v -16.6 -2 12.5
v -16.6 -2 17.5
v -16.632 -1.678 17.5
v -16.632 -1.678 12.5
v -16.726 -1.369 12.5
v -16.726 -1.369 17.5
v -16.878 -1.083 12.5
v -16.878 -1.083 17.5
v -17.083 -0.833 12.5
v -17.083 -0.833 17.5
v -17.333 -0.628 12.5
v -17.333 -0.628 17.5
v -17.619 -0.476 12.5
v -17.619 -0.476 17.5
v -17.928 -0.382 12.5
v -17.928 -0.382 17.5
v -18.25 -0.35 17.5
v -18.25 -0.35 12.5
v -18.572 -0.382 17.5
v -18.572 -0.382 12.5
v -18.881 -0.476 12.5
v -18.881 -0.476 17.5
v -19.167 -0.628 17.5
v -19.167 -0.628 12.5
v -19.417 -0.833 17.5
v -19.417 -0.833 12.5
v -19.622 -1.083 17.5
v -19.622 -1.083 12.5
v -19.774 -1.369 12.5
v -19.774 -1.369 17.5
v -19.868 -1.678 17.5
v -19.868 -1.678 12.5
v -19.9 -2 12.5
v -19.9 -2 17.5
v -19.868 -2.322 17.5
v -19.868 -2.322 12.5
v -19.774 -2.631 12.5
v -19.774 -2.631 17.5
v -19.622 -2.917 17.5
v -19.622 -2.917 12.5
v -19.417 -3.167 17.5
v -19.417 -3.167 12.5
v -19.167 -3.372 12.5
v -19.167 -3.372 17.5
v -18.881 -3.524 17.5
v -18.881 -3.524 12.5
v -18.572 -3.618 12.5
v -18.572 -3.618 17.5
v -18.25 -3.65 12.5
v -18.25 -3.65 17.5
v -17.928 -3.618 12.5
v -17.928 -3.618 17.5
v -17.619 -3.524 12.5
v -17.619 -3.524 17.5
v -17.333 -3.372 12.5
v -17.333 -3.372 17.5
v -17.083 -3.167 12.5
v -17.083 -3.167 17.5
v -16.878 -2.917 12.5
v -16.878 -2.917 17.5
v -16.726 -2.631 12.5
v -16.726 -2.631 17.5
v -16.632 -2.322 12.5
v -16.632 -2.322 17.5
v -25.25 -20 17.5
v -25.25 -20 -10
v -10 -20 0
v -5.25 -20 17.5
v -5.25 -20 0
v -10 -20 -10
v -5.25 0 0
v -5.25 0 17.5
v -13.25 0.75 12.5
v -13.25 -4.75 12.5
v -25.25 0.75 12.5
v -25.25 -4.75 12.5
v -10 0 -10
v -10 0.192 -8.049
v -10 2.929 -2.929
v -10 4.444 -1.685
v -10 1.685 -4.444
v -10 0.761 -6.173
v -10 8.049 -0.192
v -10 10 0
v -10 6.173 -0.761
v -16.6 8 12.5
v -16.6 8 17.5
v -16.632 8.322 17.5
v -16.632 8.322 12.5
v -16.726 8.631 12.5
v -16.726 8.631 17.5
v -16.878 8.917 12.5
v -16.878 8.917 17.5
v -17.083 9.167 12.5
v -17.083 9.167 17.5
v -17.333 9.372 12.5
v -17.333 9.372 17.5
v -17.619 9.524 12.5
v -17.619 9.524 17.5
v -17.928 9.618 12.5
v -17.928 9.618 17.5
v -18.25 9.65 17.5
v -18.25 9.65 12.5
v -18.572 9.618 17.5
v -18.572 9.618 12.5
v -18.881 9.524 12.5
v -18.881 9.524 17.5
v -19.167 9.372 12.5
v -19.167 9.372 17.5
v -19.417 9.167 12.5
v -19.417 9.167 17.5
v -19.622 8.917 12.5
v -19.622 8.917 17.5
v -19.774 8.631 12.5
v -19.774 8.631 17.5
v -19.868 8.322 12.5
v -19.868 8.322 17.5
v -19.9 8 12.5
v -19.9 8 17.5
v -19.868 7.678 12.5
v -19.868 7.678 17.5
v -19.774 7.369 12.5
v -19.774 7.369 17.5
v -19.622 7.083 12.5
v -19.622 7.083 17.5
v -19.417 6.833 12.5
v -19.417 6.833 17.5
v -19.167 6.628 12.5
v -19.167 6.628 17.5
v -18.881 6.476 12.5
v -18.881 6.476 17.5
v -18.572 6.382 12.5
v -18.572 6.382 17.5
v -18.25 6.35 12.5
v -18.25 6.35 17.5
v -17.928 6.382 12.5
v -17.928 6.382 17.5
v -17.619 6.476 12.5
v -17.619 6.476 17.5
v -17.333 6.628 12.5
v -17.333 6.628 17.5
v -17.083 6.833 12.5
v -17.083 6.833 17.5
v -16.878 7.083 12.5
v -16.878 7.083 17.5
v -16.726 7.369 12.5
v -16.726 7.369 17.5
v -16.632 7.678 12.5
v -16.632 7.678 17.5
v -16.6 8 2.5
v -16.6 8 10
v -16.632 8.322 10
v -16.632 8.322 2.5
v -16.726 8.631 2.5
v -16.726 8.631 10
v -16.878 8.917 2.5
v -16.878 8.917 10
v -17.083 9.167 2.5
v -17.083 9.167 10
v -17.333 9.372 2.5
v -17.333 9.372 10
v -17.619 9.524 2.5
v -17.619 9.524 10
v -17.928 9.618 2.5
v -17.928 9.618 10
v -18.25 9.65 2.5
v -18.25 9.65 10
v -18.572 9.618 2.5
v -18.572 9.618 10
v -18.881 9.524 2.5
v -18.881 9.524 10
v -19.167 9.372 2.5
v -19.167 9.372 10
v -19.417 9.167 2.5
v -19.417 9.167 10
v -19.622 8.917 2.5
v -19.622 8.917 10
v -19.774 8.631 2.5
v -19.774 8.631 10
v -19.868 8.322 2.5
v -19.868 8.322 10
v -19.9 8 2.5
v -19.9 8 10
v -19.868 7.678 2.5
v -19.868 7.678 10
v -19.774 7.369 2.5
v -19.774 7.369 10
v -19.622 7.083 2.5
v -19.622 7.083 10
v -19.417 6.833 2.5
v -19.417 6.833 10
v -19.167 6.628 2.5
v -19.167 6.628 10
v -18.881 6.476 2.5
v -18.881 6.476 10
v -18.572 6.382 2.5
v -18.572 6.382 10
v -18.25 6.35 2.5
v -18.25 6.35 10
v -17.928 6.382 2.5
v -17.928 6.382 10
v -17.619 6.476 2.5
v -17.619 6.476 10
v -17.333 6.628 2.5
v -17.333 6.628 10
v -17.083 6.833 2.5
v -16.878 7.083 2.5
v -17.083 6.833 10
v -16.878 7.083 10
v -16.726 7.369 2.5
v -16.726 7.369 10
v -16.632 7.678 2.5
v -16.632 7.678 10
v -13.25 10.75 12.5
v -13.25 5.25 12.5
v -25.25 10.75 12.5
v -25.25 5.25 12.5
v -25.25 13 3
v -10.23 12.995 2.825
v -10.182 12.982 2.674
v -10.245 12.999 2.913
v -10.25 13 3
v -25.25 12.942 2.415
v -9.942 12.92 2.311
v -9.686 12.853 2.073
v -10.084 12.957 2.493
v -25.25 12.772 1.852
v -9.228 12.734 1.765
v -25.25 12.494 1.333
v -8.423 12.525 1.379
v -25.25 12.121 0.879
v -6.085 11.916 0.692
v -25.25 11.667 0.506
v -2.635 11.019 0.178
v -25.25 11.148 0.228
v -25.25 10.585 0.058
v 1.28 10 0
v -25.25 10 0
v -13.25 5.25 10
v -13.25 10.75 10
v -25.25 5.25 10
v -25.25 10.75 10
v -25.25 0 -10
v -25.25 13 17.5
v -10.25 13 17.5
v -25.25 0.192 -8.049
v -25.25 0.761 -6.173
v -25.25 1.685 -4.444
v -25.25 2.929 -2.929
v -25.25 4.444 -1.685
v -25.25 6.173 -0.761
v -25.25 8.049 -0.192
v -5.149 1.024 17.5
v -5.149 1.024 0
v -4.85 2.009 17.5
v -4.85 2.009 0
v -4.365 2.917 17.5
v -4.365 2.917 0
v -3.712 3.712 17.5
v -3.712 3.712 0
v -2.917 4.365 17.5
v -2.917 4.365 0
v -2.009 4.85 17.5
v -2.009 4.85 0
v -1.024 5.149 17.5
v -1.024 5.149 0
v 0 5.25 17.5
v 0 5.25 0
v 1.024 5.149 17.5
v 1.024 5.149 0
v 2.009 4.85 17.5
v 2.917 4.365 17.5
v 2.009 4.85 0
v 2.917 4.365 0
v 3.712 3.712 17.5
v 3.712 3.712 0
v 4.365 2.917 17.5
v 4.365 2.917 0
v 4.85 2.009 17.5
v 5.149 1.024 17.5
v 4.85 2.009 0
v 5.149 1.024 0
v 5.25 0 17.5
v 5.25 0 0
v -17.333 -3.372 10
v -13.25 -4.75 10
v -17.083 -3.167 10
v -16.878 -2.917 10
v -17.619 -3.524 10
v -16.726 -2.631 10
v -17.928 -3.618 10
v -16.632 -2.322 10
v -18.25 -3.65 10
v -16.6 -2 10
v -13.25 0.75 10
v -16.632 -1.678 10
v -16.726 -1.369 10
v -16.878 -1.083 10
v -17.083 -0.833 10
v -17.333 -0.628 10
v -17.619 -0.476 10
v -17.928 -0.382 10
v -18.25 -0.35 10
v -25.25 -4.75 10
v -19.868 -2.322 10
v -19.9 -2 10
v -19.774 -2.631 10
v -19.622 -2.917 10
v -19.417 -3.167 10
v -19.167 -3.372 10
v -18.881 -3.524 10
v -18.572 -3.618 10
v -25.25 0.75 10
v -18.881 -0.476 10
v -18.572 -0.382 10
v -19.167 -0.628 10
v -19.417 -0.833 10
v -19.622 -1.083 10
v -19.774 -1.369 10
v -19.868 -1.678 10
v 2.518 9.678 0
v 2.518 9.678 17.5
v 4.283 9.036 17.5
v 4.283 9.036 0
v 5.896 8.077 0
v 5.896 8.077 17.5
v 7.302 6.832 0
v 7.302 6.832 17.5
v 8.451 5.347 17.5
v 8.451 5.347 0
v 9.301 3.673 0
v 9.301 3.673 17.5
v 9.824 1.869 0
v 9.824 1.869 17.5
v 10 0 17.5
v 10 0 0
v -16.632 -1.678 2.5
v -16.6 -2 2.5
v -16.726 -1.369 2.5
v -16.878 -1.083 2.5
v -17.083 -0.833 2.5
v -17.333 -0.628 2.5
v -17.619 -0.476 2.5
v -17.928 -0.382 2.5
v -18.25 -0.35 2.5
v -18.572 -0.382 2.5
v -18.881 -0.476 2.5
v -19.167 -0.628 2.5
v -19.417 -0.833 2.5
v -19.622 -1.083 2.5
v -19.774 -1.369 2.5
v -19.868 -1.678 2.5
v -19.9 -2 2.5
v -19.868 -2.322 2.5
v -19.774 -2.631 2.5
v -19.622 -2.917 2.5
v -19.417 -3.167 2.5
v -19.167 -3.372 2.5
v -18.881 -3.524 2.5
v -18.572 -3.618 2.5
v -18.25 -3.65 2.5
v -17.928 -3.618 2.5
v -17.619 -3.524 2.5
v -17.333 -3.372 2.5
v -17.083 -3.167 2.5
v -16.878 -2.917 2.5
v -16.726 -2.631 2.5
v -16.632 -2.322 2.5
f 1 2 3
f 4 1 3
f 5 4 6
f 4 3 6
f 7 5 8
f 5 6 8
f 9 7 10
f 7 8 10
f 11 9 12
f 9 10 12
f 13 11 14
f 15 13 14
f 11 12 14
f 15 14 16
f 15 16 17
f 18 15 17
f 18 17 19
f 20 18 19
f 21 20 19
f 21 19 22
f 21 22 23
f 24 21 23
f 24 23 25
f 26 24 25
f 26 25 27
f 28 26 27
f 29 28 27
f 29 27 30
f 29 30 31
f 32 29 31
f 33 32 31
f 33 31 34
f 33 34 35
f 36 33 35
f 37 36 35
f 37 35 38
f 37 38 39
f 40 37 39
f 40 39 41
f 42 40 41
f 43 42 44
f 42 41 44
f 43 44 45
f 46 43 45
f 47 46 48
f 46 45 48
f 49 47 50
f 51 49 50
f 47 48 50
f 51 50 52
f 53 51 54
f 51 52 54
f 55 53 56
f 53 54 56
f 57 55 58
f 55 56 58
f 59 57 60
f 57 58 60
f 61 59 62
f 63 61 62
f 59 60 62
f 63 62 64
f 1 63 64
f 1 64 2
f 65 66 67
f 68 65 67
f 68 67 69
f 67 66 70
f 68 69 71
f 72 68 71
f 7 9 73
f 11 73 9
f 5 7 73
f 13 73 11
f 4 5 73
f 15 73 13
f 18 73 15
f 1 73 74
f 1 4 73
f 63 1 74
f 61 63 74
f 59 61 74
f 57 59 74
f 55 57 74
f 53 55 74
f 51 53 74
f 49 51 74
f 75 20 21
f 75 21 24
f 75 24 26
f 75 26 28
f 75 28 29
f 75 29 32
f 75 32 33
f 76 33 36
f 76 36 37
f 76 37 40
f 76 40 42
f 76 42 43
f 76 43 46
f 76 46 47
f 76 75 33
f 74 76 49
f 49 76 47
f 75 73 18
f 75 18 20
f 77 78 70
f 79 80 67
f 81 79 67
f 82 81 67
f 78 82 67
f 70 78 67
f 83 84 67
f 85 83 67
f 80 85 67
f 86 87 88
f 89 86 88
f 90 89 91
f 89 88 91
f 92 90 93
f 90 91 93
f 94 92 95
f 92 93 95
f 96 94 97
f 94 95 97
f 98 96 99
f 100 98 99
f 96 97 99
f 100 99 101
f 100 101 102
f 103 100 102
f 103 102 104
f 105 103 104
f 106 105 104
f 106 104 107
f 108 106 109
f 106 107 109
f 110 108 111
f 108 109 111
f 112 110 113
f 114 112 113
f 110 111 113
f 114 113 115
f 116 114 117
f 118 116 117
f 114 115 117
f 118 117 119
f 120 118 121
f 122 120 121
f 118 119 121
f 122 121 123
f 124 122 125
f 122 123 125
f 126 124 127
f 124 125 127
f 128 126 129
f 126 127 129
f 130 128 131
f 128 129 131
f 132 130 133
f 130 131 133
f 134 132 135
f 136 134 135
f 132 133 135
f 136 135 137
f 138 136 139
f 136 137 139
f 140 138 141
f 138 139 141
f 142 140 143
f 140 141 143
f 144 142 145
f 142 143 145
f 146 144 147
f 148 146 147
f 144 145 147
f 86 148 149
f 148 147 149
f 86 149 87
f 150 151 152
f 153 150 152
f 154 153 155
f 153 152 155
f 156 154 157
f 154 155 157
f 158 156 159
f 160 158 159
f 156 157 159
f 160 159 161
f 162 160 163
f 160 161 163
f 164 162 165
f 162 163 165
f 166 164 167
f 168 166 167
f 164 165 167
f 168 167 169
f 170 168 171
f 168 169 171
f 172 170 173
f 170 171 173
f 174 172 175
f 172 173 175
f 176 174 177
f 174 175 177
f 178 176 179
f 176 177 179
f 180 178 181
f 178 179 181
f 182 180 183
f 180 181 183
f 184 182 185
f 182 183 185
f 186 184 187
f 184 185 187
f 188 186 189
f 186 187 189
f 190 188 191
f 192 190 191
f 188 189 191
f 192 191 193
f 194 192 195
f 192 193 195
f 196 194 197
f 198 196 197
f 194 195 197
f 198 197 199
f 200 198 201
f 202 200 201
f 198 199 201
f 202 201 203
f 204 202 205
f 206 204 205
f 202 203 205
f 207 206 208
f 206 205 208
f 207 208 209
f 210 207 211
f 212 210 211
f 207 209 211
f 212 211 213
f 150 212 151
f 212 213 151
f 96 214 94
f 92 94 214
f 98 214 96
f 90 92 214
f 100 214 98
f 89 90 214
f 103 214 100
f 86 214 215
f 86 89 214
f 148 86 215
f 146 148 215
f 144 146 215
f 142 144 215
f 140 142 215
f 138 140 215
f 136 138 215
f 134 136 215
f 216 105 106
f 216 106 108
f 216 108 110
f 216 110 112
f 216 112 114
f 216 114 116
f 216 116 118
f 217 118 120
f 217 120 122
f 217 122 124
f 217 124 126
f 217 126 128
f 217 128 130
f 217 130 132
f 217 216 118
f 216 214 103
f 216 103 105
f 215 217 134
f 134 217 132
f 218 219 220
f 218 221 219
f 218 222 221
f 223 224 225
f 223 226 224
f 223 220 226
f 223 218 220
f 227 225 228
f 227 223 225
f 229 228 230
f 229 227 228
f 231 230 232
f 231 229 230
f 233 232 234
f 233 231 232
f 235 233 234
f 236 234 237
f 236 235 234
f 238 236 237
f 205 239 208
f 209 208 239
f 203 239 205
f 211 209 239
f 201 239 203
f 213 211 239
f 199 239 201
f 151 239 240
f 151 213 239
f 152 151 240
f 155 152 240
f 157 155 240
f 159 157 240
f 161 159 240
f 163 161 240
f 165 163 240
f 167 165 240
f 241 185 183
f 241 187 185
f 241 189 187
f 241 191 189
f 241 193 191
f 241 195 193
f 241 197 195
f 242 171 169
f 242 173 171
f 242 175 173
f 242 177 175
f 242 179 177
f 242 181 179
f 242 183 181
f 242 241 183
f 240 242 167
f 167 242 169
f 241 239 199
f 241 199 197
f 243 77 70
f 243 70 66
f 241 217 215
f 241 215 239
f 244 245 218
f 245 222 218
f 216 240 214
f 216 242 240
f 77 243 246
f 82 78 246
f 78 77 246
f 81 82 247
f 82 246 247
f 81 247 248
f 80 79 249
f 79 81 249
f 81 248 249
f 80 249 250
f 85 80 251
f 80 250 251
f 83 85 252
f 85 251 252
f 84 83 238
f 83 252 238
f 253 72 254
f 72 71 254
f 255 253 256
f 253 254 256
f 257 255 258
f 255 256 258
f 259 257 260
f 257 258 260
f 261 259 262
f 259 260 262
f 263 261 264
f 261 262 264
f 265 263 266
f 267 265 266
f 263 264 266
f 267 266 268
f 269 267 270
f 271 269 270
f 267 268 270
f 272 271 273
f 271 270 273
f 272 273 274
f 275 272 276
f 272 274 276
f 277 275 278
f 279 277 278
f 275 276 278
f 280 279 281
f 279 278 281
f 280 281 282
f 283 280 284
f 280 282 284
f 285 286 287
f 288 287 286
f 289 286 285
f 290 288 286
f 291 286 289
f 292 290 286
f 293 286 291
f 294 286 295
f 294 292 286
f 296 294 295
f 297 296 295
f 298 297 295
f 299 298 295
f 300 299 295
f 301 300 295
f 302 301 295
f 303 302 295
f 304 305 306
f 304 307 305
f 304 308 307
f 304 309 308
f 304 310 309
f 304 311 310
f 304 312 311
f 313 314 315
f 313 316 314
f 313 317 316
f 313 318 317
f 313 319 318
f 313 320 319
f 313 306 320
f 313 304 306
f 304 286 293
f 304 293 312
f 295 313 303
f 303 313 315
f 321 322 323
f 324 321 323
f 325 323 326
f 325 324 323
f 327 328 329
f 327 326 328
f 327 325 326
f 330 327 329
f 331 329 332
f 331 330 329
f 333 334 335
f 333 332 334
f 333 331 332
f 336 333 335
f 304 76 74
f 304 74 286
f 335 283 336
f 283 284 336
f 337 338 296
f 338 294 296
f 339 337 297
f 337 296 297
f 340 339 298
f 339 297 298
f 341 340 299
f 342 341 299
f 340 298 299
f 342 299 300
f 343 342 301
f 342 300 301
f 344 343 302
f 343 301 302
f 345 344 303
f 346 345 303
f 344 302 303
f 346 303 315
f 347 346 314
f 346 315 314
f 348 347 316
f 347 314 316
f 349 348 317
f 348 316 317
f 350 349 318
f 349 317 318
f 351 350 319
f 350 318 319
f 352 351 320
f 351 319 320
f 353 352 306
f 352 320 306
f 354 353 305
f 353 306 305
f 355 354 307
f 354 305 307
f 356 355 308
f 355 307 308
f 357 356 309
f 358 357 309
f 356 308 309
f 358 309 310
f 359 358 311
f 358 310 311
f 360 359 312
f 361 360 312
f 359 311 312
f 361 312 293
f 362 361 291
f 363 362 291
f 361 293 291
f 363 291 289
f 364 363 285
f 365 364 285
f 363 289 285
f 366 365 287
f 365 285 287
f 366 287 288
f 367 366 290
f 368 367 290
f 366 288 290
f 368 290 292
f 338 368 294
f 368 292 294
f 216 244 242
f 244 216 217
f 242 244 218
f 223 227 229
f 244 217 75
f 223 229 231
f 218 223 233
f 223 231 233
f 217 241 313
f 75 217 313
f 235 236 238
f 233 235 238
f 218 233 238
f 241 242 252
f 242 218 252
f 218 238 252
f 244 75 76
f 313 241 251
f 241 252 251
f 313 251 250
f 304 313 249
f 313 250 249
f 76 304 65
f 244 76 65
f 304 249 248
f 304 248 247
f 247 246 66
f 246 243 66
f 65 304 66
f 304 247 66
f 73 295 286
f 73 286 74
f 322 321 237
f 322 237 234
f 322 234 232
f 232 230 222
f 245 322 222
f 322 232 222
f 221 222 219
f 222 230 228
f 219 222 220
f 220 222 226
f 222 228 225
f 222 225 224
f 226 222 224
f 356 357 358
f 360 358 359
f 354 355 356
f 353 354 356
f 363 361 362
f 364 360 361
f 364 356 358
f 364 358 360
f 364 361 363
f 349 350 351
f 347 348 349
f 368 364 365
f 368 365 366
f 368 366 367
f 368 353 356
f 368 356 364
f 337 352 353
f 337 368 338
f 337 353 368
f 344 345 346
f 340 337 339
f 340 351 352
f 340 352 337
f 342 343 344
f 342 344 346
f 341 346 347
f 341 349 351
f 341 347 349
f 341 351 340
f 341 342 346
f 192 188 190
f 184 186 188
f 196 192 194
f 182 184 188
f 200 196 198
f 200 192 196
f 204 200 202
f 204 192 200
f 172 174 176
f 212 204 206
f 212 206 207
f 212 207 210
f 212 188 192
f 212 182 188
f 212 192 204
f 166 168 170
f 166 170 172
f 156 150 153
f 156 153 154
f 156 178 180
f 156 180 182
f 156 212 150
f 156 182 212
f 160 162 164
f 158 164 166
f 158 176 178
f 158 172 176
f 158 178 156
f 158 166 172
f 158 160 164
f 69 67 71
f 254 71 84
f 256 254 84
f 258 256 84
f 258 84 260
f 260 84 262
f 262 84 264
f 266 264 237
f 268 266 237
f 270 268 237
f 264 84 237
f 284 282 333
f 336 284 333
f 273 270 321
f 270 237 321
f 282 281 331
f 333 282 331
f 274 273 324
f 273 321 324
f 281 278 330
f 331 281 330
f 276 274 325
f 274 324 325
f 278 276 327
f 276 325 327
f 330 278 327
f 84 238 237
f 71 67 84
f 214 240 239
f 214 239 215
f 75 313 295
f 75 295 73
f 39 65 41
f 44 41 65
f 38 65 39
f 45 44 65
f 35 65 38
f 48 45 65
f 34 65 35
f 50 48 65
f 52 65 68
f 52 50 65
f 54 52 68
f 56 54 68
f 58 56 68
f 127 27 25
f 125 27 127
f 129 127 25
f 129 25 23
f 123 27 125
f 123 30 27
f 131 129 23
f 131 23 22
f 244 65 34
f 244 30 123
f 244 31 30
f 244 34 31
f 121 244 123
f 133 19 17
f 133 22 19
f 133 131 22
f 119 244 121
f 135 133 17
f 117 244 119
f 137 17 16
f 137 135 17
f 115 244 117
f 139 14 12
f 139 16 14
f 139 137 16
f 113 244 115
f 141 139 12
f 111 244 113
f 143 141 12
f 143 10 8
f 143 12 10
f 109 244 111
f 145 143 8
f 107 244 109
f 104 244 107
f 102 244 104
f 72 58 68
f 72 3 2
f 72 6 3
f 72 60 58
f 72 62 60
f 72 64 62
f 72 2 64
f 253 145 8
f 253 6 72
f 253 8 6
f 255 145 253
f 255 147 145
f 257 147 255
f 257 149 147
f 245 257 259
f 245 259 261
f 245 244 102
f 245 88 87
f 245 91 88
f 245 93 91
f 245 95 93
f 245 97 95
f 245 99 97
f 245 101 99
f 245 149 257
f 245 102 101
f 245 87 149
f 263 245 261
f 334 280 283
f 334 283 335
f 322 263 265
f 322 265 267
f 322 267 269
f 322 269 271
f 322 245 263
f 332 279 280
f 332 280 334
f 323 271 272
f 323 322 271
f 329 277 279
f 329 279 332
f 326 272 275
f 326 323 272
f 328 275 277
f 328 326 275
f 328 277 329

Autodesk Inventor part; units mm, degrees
ref_plane "YZ Plane" through (0, 0, 0) normal (1, 0, 0) x (0, 1, 0)
ref_plane "XZ Plane" through (0, 0, 0) normal (0, 1, 0) x (-1, 0, 0)
ref_plane "XY Plane" through (0, 0, 0) normal (0, 0, 1) x (1, 0, 0)
sketch "Sketch1" plane through (0, 0, 0) normal (0, 0, 1) x (1, 0, 0)
  arc A0 (5.25, 0) -> (-5.25, 0) centre (0, 0) ccw
  arc A1 (10, 0) -> (-3.960396, 9.182334) centre (0, 0) ccw
  line L0 (-5.25, -8.511022) -> (-5.25, -20)
  line L1 (-5.25, -20) -> (-25.25, -20)
  line L2 (-25.25, -20) -> (-25.25, 0)
  line L3 (5.25, 0) -> (10, 0)
  line L4 (-25.25, 0) -> (-3.960396, 9.182334)
  line L5 (-5.25, -8.511022) -> (-5.25, 0)
  line L6 (-25.25, 0) -> (-25.25, 13)
  line L7 (-25.25, 13) -> (-10.25, 13)
  line L8 (-10.25, 13) -> (2.706976, 9.628622)
  point P0 (1.153738, 9.933221)
  point P1 (2.518133, 9.677758)
  dimension "d0" = 10.5
  dimension "d1" = 20
  dimension "d3" = 20
  dimension "d5" = 20
  dimension "d6" = 0
  dimension "d7" = 20
  dimension "d14" = 13
  dimension "d18" = 15
sketch "Sketch1 outline for Extrusion1" plane through (0, 0, 0) normal (0, 0, 1) x (1, 0, 0)
  arc A0 (10, 0) -> (2.518133, 9.677758) centre (0, 0) ccw
  line L0 (2.518133, 9.677758) -> (-10.25, 13)
  line L1 (-10.25, 13) -> (-25.25, 13)
  line L2 (-25.25, 13) -> (-25.25, -20)
  line L3 (-25.25, -20) -> (-5.25, -20)
  line L4 (-5.25, -20) -> (-5.25, 0)
  arc A1 (-5.25, 0) -> (5.25, 0) centre (0, 0) cw
  line L5 (5.25, 0) -> (10, 0)
extrude "Extrusion1" add sketch "Sketch1 outline for Extrusion1" along normal blind 17.5
sketch "Sketch3" plane through (0, 0, 17.5) normal (0, 0, 1) x (1, 0, 0)
  point P0 (0, 0)
sketch "Sketch4" plane through (0, 0, 0) normal (0, 0, -1) x (-1, 0, 0)
  arc A0 (-2.518133, 9.677758) -> (-10, 0) centre (0, 0) ccw
  line L0 (25.25, 13) -> (25.25, -20)
  arc A1 (-2.518133, 9.677758) -> (-10, 0) centre (0, 0) ccw
  line L1 (-5.25, 0) -> (-10, 0)
  arc A2 (5.25, 0) -> (-5.25, 0) centre (0, 0) ccw
  line L2 (5.25, -20) -> (5.25, 0)
  line L3 (25.25, -20) -> (5.25, -20)
  circle A3 centre (0, 0) radius 10
  line L4 (10, 11.228722) -> (10, -20)
  line L5 (25.25, -20) -> (5.25, -20)
  line L6 (10, 0) -> (25.25, 0)
  line L7 (25.25, 13) -> (25.25, -20)
  line L8 (10.25, 13) -> (25.25, 13)
  line L9 (-2.518133, 9.677758) -> (10.25, 13)
  point P0 (-1.153738, 9.933221)
extrude "Extrusion3" add sketch "Sketch4" along normal blind 10 contours L6 L0 L3 L4
fillet "Fillet1" radius 10 1 edges at (-17.625, 0, 0)
sketch "Sketch5" plane through (0, 0, 17.5) normal (0, 0, 1) x (1, 0, 0)
  line L0 (-25.25, 13) -> (-25.25, -20)
  line L1 (-25.25, -20) -> (-5.25, -20)
  line L2 (-5.25, -20) -> (-5.25, 0)
  arc A0 (5.25, 0) -> (-5.25, 0) centre (0, 0) ccw
  line L3 (5.25, 0) -> (10, 0)
  arc A1 (10, 0) -> (2.518133, 9.677758) centre (0, 0) ccw
  line L4 (2.518133, 9.677758) -> (-10.25, 13)
  line L5 (-10.25, 13) -> (-25.25, 13)
  circle A2 centre (-18.25, 8) radius 1.65
  circle A3 centre (-18.25, -2) radius 1.65
  dimension "d19" = 3.3
  dimension "d20" = 3.3
  dimension "d22" = 5
  dimension "d23" = 10
  dimension "d24" = 7
  dimension "d25" = 7
extrude "Extrusion4" cut sketch "Sketch5" against normal blind 15 contours A2 | A3
sketch "Sketch6" plane through (-25.25, -20, 17.5) normal (-1, 0, 0) x (0, 0, 1)
  line L0 (-7.5, 30.75) -> (-5, 30.75)
  line L1 (-5, 30.75) -> (-5, 25.25)
  line L2 (-5, 25.25) -> (-7.5, 25.25)
  line L3 (-7.5, 25.25) -> (-7.5, 30.75)
  line L4 (-7.5, 20.75) -> (-5, 20.75)
  line L5 (-5, 20.75) -> (-5, 15.25)
  line L6 (-5, 15.25) -> (-7.5, 15.25)
  line L7 (-7.5, 15.25) -> (-7.5, 20.75)
  line L8 (0, 19.65) -> (0, 16.35) projected
  line L9 (0, 29.65) -> (0, 26.35) projected
  point P0 (-17.5, 20)
  point P1 (-27.5, 16.35)
  point P2 (-27.5, 19.65)
  dimension "d28" = 5.5
  dimension "d29" = 5.5
  dimension "d30" = 2.5
  dimension "d31" = 2.5
  dimension "d32" = 0
  dimension "d33" = 5
  dimension "d34" = 3.3
  dimension "d35" = 1.1
  dimension "d36" = 1.1
  dimension "d37" = 1.1
  dimension "d38" = 1.1
extrude "Extrusion5" cut sketch "Sketch6" against normal blind 12
fillet "Fillet2" radius 3 1 edges at (-17.75, 13, 0)
equation "\"d7\" = d5"
equation "\"d29\" = d28"
equation "\"d31\" = d30"
equation "\"d35\" = -0.5 * d34 + 0.5 * d28"
equation "\"d37\" = d38"
properties part number "XAxisLimitSwitchMount"
